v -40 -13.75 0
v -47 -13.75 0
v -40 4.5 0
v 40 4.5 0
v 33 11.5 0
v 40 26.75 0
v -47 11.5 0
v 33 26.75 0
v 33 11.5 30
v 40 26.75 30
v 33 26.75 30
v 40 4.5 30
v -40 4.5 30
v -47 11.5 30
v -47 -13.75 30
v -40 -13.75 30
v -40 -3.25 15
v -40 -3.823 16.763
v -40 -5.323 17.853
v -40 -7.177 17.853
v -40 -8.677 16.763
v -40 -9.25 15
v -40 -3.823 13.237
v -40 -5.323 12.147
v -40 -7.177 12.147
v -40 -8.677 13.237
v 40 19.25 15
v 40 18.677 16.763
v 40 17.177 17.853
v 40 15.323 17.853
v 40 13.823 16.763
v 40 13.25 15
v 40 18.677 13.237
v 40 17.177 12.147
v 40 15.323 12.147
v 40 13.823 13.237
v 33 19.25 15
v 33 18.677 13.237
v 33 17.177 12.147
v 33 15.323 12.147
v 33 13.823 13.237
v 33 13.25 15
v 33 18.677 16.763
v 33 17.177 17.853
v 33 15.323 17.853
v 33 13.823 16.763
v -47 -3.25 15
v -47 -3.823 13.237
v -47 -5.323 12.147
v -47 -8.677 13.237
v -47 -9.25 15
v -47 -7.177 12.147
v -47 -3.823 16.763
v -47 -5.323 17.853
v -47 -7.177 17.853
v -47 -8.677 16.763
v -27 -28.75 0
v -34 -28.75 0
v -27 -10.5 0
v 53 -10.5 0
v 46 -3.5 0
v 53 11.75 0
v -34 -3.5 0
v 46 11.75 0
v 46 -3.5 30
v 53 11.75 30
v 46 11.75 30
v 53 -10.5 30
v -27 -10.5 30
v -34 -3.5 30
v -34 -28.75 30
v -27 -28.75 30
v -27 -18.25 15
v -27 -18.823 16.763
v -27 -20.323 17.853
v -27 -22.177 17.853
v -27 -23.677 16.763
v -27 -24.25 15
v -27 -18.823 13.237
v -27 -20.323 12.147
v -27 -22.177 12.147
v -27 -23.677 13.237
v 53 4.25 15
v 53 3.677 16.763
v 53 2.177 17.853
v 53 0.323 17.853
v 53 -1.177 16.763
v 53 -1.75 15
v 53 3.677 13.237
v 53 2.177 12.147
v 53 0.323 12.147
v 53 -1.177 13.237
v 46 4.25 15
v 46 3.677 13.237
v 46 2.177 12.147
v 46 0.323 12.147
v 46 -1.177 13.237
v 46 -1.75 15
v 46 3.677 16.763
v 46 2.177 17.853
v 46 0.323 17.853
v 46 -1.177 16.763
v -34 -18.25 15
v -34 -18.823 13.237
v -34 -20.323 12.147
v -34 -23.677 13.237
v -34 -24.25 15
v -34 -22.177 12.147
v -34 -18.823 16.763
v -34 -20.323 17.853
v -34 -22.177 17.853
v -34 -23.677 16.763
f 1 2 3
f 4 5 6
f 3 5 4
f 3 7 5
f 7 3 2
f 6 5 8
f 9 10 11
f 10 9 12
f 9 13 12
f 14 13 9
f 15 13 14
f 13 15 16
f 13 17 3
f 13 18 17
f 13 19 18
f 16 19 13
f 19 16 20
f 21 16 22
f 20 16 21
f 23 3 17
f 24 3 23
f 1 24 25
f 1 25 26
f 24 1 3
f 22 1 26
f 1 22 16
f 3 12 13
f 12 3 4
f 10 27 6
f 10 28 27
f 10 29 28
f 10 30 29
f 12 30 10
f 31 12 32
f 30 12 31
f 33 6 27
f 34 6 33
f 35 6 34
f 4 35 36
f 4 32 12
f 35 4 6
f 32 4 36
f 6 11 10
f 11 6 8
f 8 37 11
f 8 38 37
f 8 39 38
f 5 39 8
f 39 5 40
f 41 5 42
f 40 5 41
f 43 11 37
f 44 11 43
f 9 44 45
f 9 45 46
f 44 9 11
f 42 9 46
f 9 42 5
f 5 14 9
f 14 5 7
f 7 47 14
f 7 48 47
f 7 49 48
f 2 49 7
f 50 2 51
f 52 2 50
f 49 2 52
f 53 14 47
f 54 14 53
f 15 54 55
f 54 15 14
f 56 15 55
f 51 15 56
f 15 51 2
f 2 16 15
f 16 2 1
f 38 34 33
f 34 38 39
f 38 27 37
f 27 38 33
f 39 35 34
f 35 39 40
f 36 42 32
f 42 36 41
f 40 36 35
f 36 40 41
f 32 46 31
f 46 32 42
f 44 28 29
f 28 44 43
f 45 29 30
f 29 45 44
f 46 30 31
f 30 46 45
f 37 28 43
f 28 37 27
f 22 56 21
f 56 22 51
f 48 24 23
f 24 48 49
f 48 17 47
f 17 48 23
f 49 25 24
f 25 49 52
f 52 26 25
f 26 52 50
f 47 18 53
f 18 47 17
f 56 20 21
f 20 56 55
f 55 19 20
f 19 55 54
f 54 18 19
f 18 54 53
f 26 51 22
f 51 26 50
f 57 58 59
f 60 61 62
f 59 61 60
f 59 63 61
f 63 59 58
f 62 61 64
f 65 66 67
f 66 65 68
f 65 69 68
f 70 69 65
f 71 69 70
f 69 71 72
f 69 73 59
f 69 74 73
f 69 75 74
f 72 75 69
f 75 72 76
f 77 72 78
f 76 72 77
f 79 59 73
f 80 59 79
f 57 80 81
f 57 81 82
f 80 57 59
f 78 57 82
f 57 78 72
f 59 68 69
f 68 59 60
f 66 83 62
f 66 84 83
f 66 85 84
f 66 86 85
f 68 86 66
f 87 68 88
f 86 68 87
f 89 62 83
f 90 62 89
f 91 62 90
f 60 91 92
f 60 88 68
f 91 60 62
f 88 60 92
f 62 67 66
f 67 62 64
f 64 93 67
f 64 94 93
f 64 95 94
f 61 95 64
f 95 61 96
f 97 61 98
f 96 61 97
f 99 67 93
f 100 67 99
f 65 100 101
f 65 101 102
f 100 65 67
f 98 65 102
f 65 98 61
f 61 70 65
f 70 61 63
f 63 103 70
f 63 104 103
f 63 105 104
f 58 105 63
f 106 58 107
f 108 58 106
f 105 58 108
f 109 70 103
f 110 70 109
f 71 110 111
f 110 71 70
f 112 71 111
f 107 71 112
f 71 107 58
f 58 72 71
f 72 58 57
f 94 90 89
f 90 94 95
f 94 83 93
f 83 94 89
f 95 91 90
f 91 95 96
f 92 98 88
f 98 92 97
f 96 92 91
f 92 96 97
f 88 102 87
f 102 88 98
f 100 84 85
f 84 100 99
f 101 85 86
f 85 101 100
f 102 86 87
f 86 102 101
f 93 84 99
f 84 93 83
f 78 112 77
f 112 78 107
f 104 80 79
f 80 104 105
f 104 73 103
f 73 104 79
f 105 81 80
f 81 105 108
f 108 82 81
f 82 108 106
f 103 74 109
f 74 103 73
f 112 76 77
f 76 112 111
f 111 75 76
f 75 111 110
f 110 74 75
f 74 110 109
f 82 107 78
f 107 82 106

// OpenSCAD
depth = 30;
thick = 7;
height = 80;
rad = 5;
dx = 22.5;
offset = 3;



module base(){

	linear_extrude(height = depth) {
	       translate([-thick*0.5 + offset, 0]) square([dx/2+thick*2-offset, thick]);
		translate([-(dx/2+thick*1.5) + offset,height]) square([dx/2+thick*2-offset, thick]);
		translate([-thick*0.5+offset,0]) square([thick, height + thick]);
	};
}

module a() {
	difference() {
		base();
		translate([dx/2, -1, depth/2])  rotate ([-90, 0, 0]) cylinder(r = 3, h= thick + 2);
		translate([-dx/2, -1+height, depth/2])  rotate ([-90, 0, 0]) cylinder(r = 3, h= thick + 2);
	}
}

module mk7_bracket_stl() {
	translate([40, 5, 0]) rotate([0,0,90]) {
		a();
		translate([-15,-13,0]) a();
	}
}

mk7_bracket_stl();
